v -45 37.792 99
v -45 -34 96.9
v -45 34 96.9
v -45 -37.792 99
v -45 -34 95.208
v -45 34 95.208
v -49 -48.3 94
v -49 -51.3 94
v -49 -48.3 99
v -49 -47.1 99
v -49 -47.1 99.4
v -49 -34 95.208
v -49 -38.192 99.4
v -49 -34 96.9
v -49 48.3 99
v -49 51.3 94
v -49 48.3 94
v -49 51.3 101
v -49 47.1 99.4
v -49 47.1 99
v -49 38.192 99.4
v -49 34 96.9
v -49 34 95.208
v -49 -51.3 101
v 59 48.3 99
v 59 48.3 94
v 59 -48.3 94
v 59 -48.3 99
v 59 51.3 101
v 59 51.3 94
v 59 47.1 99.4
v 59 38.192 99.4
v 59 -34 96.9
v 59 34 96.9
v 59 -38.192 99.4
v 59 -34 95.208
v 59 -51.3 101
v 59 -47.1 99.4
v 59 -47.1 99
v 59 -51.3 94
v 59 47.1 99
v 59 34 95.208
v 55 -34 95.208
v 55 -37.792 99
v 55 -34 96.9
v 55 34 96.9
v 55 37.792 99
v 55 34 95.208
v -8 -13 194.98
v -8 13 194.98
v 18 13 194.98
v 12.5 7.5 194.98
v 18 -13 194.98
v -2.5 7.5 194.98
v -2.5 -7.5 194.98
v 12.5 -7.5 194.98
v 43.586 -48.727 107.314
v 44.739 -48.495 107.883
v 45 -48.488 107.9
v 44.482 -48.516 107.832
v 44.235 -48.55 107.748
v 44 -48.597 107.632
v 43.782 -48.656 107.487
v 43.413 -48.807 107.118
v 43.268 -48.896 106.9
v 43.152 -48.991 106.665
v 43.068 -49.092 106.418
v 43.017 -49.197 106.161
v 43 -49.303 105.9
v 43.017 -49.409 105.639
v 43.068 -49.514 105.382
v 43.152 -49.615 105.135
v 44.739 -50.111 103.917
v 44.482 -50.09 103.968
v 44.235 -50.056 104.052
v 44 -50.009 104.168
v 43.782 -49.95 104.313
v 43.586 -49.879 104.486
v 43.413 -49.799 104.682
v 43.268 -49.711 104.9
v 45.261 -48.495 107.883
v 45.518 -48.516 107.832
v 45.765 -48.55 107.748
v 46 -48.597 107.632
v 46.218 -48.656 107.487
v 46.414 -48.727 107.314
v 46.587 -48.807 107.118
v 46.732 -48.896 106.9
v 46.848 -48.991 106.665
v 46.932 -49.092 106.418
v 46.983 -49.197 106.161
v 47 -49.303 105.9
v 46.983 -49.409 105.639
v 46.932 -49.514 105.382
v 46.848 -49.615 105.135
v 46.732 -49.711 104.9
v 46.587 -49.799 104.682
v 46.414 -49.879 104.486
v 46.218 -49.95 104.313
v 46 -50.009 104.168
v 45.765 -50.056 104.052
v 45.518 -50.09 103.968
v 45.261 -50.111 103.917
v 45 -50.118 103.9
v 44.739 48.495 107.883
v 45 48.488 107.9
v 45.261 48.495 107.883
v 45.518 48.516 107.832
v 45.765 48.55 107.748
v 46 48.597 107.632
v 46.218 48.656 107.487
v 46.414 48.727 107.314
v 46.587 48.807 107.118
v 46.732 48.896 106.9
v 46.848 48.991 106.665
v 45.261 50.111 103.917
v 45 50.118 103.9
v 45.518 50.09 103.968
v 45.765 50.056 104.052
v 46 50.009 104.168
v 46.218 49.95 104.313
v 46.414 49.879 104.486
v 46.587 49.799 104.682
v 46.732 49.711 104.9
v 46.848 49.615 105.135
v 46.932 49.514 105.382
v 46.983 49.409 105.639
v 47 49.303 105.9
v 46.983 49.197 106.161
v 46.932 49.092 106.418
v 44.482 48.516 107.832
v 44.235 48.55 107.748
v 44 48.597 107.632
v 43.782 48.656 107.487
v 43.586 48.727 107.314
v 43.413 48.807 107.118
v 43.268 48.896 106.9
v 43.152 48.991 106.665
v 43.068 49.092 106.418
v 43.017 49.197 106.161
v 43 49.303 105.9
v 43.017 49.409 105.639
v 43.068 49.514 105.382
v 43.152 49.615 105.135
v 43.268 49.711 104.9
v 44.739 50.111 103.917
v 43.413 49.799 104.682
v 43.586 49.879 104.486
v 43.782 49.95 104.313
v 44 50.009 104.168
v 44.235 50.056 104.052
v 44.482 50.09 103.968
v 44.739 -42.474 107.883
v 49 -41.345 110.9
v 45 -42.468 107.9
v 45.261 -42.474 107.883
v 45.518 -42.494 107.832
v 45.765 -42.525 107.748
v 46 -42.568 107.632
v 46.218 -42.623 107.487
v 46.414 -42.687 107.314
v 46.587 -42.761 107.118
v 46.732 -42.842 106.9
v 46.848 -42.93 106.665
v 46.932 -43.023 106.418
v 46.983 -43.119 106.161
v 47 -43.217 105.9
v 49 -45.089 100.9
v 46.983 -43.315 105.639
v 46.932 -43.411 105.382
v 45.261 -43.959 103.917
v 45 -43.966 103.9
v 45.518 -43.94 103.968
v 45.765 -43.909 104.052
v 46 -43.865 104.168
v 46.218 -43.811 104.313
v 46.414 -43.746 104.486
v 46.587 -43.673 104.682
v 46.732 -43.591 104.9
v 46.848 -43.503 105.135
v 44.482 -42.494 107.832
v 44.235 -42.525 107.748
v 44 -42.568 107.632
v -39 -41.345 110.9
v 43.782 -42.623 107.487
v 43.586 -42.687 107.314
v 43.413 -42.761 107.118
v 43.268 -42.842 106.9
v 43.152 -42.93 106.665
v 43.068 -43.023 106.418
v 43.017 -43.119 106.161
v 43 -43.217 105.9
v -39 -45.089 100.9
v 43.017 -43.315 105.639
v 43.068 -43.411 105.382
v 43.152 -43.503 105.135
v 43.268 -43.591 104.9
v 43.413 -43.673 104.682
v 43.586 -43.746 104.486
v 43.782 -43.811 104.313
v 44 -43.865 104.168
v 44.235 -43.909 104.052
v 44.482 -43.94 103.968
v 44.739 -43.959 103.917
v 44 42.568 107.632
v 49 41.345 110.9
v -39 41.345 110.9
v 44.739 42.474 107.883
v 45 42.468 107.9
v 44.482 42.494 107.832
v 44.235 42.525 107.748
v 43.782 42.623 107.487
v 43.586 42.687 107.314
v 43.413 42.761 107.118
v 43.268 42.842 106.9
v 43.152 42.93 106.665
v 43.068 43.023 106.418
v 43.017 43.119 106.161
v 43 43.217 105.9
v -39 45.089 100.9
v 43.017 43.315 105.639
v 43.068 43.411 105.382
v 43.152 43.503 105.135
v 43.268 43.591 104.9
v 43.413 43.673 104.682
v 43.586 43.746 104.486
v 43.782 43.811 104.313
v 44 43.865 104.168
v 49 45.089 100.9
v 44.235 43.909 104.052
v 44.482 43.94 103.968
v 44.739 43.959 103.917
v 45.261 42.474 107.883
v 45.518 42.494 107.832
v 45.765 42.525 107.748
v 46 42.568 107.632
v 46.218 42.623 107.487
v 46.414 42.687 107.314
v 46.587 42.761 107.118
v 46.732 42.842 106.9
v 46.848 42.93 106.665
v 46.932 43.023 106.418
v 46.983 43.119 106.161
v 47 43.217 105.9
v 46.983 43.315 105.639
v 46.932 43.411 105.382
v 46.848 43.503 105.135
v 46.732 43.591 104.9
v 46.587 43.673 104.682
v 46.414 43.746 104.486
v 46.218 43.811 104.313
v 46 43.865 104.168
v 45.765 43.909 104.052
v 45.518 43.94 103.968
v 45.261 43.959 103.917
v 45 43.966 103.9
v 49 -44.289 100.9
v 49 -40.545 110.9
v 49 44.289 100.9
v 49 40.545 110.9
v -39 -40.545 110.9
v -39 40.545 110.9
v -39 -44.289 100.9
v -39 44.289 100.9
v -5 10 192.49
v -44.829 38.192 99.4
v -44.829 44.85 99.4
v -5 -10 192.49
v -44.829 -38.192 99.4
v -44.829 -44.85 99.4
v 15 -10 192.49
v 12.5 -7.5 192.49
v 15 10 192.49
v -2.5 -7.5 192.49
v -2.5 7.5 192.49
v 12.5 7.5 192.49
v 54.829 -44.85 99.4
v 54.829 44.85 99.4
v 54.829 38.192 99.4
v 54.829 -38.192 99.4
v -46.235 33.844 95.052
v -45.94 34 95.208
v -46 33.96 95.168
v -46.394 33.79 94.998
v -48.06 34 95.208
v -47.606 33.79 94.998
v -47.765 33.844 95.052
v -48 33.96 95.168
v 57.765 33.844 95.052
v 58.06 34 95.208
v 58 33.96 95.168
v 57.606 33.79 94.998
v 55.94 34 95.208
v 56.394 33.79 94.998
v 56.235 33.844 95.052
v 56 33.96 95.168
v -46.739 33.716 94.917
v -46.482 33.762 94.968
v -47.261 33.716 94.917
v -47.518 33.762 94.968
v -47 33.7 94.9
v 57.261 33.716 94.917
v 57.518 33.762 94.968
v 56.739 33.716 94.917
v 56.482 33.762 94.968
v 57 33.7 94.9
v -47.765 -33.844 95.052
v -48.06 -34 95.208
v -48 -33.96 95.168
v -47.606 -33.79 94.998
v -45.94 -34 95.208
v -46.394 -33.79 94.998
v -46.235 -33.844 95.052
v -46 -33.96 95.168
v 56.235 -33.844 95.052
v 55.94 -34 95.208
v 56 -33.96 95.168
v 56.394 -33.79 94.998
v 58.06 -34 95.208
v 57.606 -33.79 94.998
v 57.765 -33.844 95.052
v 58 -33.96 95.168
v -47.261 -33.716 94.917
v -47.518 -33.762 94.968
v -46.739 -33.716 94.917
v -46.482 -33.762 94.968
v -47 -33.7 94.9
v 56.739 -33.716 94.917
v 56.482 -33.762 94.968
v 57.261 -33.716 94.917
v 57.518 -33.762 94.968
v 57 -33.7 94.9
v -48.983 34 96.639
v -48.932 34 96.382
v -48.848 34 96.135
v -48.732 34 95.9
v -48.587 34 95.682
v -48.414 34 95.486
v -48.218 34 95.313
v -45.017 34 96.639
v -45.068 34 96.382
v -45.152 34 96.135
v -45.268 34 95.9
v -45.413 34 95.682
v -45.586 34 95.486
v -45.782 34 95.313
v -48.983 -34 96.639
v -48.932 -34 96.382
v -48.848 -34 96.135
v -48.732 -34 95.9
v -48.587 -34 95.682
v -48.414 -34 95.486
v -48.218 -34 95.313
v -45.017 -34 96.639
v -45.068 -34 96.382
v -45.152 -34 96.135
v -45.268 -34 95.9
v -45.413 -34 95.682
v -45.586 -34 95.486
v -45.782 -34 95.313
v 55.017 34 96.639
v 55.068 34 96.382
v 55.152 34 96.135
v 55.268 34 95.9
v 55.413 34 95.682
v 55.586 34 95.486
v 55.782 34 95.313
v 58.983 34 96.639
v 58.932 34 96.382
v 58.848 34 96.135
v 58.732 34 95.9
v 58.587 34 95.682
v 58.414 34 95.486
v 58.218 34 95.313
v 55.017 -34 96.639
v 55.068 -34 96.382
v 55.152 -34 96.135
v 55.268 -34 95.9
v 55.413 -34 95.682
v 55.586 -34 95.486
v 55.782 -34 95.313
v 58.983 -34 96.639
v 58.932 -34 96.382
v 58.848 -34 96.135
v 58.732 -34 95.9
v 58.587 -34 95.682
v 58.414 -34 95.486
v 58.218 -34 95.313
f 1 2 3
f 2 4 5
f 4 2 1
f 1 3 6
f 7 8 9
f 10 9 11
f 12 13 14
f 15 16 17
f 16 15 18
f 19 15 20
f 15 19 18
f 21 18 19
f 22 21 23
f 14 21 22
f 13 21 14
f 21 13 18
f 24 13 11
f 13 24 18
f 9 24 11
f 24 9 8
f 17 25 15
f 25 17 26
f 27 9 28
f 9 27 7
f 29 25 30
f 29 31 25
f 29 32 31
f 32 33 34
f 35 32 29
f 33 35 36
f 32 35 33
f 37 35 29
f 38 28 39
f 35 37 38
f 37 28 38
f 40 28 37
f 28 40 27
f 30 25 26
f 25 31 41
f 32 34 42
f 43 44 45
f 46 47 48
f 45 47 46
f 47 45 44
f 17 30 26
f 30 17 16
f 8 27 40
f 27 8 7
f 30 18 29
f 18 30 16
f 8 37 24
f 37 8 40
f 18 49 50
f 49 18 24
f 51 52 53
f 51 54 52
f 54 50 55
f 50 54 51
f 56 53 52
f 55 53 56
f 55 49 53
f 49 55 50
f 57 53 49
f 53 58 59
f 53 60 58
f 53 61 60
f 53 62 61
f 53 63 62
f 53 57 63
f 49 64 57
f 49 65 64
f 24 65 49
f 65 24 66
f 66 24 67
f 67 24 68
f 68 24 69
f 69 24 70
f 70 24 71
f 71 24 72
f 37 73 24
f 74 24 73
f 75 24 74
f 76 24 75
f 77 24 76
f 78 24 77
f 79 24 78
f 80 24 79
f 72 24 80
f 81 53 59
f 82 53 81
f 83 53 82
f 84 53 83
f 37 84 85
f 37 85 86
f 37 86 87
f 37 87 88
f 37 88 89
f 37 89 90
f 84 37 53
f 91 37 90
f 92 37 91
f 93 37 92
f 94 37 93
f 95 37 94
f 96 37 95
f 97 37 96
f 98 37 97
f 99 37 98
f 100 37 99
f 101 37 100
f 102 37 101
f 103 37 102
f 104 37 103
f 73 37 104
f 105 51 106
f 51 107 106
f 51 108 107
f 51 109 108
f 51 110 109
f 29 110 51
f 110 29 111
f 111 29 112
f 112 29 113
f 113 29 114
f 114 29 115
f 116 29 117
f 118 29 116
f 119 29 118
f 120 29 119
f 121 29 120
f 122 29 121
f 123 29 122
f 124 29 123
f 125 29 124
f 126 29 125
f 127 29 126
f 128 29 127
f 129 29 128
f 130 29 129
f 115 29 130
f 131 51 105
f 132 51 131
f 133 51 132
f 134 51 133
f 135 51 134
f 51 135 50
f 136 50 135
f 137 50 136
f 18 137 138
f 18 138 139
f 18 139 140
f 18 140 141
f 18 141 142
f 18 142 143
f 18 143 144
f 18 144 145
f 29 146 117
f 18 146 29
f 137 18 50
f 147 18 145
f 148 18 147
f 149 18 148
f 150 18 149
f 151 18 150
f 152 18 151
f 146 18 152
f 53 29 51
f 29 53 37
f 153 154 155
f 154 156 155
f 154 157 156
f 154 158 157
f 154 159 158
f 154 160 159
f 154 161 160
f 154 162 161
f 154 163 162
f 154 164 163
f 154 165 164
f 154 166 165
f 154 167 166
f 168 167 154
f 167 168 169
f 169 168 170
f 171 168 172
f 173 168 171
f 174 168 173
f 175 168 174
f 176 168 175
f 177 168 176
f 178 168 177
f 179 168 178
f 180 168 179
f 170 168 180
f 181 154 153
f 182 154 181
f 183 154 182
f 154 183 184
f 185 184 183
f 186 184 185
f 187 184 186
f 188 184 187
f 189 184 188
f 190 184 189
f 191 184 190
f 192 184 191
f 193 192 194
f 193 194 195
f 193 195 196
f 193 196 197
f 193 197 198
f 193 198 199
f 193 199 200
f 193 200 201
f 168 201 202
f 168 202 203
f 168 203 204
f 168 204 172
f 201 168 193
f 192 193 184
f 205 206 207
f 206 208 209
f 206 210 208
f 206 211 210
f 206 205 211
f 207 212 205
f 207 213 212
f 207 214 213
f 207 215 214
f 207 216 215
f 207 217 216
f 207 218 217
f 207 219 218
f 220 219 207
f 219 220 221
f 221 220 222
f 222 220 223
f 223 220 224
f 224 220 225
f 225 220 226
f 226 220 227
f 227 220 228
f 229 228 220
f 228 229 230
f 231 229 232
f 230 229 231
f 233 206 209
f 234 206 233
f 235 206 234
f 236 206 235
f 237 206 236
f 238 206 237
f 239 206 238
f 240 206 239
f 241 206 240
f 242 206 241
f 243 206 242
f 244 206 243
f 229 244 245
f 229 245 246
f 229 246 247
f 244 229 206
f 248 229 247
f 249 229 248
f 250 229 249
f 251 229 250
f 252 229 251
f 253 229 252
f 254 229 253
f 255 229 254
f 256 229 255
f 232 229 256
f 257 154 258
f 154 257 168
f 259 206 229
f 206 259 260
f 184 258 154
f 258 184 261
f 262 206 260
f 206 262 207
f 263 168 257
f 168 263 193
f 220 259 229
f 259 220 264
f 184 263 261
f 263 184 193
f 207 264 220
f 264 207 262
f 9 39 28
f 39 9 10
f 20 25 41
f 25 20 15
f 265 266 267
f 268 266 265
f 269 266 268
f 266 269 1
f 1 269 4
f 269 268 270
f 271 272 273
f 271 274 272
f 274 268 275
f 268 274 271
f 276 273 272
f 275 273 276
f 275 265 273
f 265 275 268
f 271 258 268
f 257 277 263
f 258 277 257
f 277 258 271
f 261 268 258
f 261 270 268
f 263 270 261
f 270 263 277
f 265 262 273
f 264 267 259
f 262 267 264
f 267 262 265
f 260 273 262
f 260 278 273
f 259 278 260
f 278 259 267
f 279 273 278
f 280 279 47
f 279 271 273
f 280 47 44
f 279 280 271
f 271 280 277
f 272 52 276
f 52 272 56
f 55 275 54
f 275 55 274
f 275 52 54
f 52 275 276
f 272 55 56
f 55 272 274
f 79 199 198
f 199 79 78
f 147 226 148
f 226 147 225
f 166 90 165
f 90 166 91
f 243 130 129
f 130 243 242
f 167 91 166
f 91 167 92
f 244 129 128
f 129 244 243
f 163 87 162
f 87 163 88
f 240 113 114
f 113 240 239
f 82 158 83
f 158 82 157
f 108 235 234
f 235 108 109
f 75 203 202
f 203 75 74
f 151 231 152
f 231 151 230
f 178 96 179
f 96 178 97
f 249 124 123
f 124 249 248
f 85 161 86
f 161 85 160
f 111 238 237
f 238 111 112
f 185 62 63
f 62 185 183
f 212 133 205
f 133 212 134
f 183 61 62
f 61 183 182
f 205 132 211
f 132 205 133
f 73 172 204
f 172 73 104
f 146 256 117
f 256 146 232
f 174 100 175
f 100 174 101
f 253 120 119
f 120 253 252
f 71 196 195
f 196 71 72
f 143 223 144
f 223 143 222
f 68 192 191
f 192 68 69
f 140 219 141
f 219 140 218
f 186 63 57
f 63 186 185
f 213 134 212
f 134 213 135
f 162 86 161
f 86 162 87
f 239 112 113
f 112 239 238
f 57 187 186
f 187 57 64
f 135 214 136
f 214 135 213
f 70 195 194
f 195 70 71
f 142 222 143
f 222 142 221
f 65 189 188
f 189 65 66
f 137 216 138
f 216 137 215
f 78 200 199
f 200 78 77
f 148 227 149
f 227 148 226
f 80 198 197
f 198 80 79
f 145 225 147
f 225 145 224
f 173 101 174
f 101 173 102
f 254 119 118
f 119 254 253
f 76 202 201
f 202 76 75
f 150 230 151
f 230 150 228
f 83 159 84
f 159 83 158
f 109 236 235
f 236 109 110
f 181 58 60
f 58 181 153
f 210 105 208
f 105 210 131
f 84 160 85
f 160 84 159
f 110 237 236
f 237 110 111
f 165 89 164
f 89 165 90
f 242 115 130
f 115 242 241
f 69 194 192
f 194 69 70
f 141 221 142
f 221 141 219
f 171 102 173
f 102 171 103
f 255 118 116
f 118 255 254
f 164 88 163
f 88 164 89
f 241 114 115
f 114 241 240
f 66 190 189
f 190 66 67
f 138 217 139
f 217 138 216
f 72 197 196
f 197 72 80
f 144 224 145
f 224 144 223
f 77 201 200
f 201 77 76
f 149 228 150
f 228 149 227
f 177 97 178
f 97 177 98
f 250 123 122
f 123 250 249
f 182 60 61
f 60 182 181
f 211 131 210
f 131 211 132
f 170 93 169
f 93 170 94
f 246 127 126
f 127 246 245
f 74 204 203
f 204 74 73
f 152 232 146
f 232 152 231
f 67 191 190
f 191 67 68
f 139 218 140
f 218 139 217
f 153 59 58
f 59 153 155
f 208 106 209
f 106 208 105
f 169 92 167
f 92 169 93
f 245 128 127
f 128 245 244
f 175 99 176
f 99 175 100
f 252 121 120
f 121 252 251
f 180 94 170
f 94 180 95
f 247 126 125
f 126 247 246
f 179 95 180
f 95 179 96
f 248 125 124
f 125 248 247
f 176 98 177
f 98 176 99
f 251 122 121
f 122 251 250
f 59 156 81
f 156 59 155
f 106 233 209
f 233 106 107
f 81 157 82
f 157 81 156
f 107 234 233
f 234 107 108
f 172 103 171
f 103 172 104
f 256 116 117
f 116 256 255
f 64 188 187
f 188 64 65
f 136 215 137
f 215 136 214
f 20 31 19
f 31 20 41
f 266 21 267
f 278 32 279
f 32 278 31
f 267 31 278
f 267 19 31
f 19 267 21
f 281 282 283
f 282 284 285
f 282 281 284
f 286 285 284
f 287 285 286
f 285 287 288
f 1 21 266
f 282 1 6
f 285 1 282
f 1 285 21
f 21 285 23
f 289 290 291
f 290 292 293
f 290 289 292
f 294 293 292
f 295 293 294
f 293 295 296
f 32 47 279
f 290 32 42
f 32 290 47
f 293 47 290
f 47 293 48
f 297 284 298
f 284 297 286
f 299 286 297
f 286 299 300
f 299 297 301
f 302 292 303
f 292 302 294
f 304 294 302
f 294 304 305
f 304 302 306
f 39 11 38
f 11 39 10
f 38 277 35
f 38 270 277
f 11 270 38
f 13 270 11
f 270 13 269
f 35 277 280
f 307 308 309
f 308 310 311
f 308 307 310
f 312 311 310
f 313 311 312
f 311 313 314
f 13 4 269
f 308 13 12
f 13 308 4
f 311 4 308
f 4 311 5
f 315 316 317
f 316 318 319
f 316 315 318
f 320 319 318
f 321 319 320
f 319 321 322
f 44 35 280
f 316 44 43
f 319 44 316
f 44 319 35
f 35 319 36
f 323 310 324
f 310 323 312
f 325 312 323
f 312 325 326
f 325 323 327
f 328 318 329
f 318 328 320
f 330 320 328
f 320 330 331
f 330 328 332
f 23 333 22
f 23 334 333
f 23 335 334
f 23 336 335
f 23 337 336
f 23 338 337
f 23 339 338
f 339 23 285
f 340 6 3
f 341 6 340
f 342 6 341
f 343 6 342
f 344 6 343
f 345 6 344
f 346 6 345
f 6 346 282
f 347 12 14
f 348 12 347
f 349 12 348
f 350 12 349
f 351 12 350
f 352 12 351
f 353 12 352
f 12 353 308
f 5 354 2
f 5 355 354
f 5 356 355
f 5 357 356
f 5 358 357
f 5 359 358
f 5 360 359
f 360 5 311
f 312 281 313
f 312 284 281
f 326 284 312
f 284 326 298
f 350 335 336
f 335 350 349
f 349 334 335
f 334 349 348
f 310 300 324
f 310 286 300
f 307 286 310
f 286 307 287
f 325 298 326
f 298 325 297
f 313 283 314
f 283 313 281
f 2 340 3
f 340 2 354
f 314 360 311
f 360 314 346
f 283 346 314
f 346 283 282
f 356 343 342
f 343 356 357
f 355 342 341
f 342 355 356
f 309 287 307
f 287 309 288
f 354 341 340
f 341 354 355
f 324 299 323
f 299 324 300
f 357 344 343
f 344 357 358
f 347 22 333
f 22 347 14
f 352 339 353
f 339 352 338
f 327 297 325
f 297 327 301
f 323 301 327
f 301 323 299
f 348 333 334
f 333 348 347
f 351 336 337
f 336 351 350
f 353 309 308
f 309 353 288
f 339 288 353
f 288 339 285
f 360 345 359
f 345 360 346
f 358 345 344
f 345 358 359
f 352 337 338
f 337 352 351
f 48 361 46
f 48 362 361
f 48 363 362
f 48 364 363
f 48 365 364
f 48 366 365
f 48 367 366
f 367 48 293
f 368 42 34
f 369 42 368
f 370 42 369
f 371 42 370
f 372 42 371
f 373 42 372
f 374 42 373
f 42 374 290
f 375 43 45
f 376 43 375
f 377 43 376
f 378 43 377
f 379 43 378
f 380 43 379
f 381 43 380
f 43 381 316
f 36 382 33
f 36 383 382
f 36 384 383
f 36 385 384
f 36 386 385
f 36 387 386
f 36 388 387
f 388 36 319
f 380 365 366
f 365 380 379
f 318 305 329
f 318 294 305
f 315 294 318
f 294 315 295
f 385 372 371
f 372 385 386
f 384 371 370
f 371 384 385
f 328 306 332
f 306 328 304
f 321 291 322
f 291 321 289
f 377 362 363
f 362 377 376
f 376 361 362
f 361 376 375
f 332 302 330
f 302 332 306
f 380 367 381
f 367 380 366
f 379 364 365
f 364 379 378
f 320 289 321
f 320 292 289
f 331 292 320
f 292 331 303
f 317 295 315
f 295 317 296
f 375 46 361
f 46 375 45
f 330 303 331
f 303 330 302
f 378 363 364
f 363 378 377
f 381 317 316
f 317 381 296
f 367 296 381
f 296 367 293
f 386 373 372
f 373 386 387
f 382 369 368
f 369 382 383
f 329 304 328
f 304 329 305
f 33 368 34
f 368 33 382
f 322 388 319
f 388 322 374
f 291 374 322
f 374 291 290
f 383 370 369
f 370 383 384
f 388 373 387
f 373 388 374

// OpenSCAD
// file: machine_frame.scad
// =============================================
// Riftbound Card Sorter — shared machine frame
// =============================================
// Single source of truth for the card path after the Nov 11 redesign
// (suction pick from a motor-raised hopper, raised transport line,
// cradle shuttle sorter). Machine coords as in assembly.scad:
//   X = card travel (hopper -> belt -> tray), Y = across belt (+Y = back,
//   electronics side), Z = up, Z=0 bottom of baseplate tiles.
// `use <machine_frame.scad>` does not import variables, so read these via
// the functions at the bottom.
// =============================================

base_top   = 4;      // top of baseplate tiles
riser_h    = 60;     // conveyor deck raised so cards can FALL into both tray floors
deck_z     = base_top + riser_h;          // rail base / hopper deck reference = 64

// Conveyor (geometry unchanged, just lifted by riser_h)
belt_x0    = -165;   // belt start
belt_x1    = 85;     // belt end
roller_x   = [-140, 60];
rail_in    = 45;     // |Y| of rail inner faces
shaft_z    = deck_z + 15;
card_z     = deck_z + 15 + 11.9;          // top of round belts = card face = 90.9
scan_flat  = [-127, 47];                  // slide-bed backed flat zone (X)

// Scanner
cam_x      = 5;      // lens axis; card centred here for capture (moved from -40 so the hood clears the arm drop zone at X -139..-51)

// Hopper (motor-raised floor keeps top card at card_z)
hopper_x   = -215;   // cavity centre X (Y = 0)

// Baseplate extents (3x3 tiles of 190x180)
base_x     = [-285, 285];
base_y     = [-270, 270];

// Pick & place hand-off
drop_x     = -95;    // card CENTRE when the suction arm releases it onto the belt
                     // (card spans -139..-51: on belts, clear of hopper wall)
drop_clear = 3;      // card underside this far above belt at release (low drop)

// Sorting tray (bottom on baseplate); owner of tray placement may move it in X
tray_floor_lower_z = base_top + 2.5;      // lower slot floor
tray_floor_upper_z = base_top + 65 + 3 + 2.5;  // = 74.5 upper slot floor

// Card
card_w = 63; card_l = 88; card_t = 0.33;  // RAW cards (owner confirmed 2026-11-11: no sleeves), ~1.75 g

// MG996R mounting-tab holes (all three servos: pick arm ch0, shuttle ch1 / ch2).
// ONE value for every mount: hole-centre pitch along the case (49.5, TowerPro
// MG996R drawing) × across it (10), symmetric about the case centre. Clones
// vary (48.5..50 seen); the servo's own tab holes are Ø4.5+ grommet holes, so
// an M3 / M2.5 still lands for ±0.7 mm. MEASURE YOUR SERVO; if it is further
// off, change it here and re-export the arm head and the shuttle end post / riser.
mg996r_hole_pitch = 49.5;
mg996r_hole_dx    = 10;

function frame_base_top()  = base_top;
function frame_riser_h()   = riser_h;
function frame_deck_z()    = deck_z;
function frame_belt_x0()   = belt_x0;
function frame_belt_x1()   = belt_x1;
function frame_roller_x()  = roller_x;
function frame_rail_in()   = rail_in;
function frame_card_z()    = card_z;
function frame_scan_flat() = scan_flat;
function frame_cam_x()     = cam_x;
function frame_hopper_x()  = hopper_x;
function frame_base_x()    = base_x;
function frame_base_y()    = base_y;
function frame_drop_x()    = drop_x;
function frame_drop_clear()= drop_clear;
function frame_tray_floor_lower_z() = tray_floor_lower_z;
function frame_tray_floor_upper_z() = tray_floor_upper_z;
function frame_mg996r_hole_pitch() = mg996r_hole_pitch;
function frame_mg996r_hole_dx()    = mg996r_hole_dx;
// main file
// =============================================
// Riftbound Card Sorter — Scanner Hood (+ asm_scan_station)
// =============================================
// Light-tight box over the scan zone. Straddles both conveyor rails and rests
// ONLY on the rails' 1.2 mm top fins (z 99; contact |Y| 47.1..48 × 108 mm per
// side ≈ 190 mm² — the hood keeps 0.4 mm off the card guides and their
// groove fills, which stop at |Y| 46.7), skirts overlap the rails' outer
// faces by 5 mm. The camera (camera_bracket.scad) hangs
// above it with the lens through the roof port, so no room light reaches
// the card except through the two low card slots.
//
// Print 1×, roof down (part = "hood"). Black PLA/PETG, 0.2 mm, 3 walls,
// 15 % infill. No supports: walls lean ≤ 23° from vertical, everything else
// opens upward in print orientation.
// BRIM REQUIRED: the print is 101 mm tall and grows outward from a 26 × 26
// roof with a 15 × 15 lens port, i.e. only 451 mm² on the bed under a
// 108 × 103 top. Use an 8–10 mm brim (outer brim only; or 4 Ø15 mouse ears
// at the roof corners), a clean textured/PEI plate with glue stick for
// PETG, and ≤ 60 mm/s outer walls; a tall top-heavy part on that footprint
// otherwise lifts or is knocked off by the nozzle near the top.
//
// COORDINATES: machine frame (machine_frame.scad); scanner_hood() is already
// placed. asm_scan_station() places hood + guides + clips + camera bracket.
//
// ---------------------------------------------
// GEOMETRY (cam_x = frame_cam_x(), card face zc = 90.9, rail top 99)
//   Inner length along X 100 (cam_x ± 50), end walls 4 → outer cam_x ± 54
//   Inner width over the rails |Y| 45, skirts |Y| 48.3..51.3 down to z 94
//   Card slots: |Y| ≤ 34.0, ceiling zc + 4.0 = 94.9 (3.5 mm over a 0.5 mm
//     sleeved card), ceiling edge a full R2 bullnose. Beyond |Y| 34 the end
//     wall follows the card-guide profile with 0.4 mm clearance.
//   Walls taper from (±50, ±45) at z 99 to (±10, ±10) under the roof
//   Roof 2.5 mm, top at PCB front − 2.9 = z 195.0; lens port 15 × 15
//
// VIEW-CONE MATH (Pi Cam 3 standard, apex at the lens tip, h = height
// above the card face, lens tip at h = 100):
//   full FOV half-widths at h:  X (100 − h)·tan 33°   = 0.649·(100 − h)
//                               Y (100 − h)·tan 20.5° = 0.374·(100 − h)
//     at the card (h = 0): X ±64.9, Y ±37.4
//   needed region = card + 5 mm: X ±(44 + 5) = ±49
//                                Y ±(31.5 + 1.7 play + 5) = ±38.2 → capped by
//                                the sensor at ±37.4
//   needed half-widths at h:  X 49·(1 − h/100), Y 38.2·(1 − h/100)
//   hood interior at h (z = 90.9 + h), for z ≥ 99:
//     X 50 − 40·(z − 99)/93.5,  Y 45 − 35·(z − 99)/93.5
//     at z  99 (h  8.1): interior X ±50.0 / Y ±45.0 vs needed ±45.0 / ±35.1
//     at z 150 (h 59.1): interior X ±28.2 / Y ±25.9 vs needed ±20.0 / ±15.6
//     at z 190.9 (lens):  interior X ±10.7 / Y ±10.6 vs needed 0
//   below z 99 the interior is the rail channel |Y| < 45 and the end walls'
//   inner faces at X ±50, which the cone passes at ±47.0 at the slot ceiling
//   (h = 4). → No hood or guide surface is inside the card + 5 mm cone.
//   The roof is ABOVE the lens tip, so the "window" is just a port for the
//   lens body: the cone starts below the roof and the port never clips it.
//
// LIGHTING: the old ø52 LED-ring recess is dropped — a ring around the lens
//   puts a specular hotspot in the middle of glossy/foil cards. Instead the
//   two long inner side walls carry a 10 mm band (0.8 mm recess) at
//   h = 10..20 mm for 8 mm LED strip (≈ 88 mm per side, wires through the
//   ø4 holes). Mirror glare of a strip at (Y_L, h_L) lands on the card plane
//   at y = Y_L·100/(100 + h_L): strip centre (42.4, 15) → 36.9, strip top
//   edge (40.5, 20) → 33.8, both outside the card even at 1.7 mm play (33.2).
//   Strips must stay below h ≈ 21 for that to hold.
// ---------------------------------------------

use <machine_frame.scad>
use <card_guide.scad>
use <camera_bracket.scad>

/* [Export] */
part = "assembly";   // assembly (hood in place) | hood (print orientation) | station

$fn = 48;

cx        = frame_cam_x();
zc        = frame_card_z();
rail_in   = frame_rail_in();          // 45
rail_top  = guide_rail_top();         // 99
ch_hw     = guide_channel_hw();       // 33.2

// --- Shell ---
out_hx    = scan_hood_half_len();     // 54 (card_guide.scad keeps clips clear of it)
end_t     = 4;
in_hx     = out_hx - end_t;           // 50 → inner length 100
sk_in     = rail_in + 3 + 0.3;        // 48.3 (rail outer face 48)
sk_out    = sk_in + 3;                // 51.3
sk_bot    = rail_top - 5;             // 94 (5 mm overlap on the rail outer face)
z_lb      = rail_top + 2;             // top of the vertical lower band
roof_t    = 2.5;
roof_top  = zc + cam_pcb_front_rel() - 2.9;   // 195.0: M2 heads clear by ≥ 0.9
roof_bot  = roof_top - roof_t;
top_out   = 13;                       // outer half-size at the roof
top_in    = 10;                       // inner half-size under the roof
port      = 15;                       // lens-body port (lens holder ≤ ~12 mm)

// --- Card slots ---
slot_hw   = 34.0;                     // guide envelope meets the slot ceiling here
slot_top  = zc + 4.0;                 // 94.9
lip_r     = end_t / 2;                // full bullnose on the slot ceiling

// --- LED bands ---
led_h     = [10, 20];                 // above the card face
led_d     = 0.8;
led_hx    = 44;
wire_d    = 4;

// --- View cone check values ---
lens_z    = zc + cam_lens_h();
need_hx   = 88 / 2 + 5;
need_hy   = min(63 / 2 + (ch_hw - 63 / 2) + 5, cam_lens_h() * tan(20.5));
function need_x(z) = need_hx * (lens_z - z) / (lens_z - zc);
function need_y(z) = need_hy * (lens_z - z) / (lens_z - zc);
function cav_x(z)  = in_hx - (in_hx - top_in) * (z - rail_top) / (roof_bot - rail_top);
function cav_y(z)  = rail_in - (rail_in - top_in) * (z - rail_top) / (roof_bot - rail_top);

echo(str("HOOD: X ", cx - out_hx, "..", cx + out_hx, " (inner ", 2 * in_hx, "), roof top z ", roof_top,
         ", slot |Y|≤", slot_hw, " ceiling z ", slot_top, " (", slot_top - zc, " over card face)"));
echo(str("HOOD VIEW CONE: needed card+5 at card plane X ±", need_hx, " Y ±", need_hy,
         "; at z99 cavity ±", cav_x(99), "/±", cav_y(99), " vs ±", need_x(99), "/±", need_y(99),
         "; at slot ceiling needed X ±", need_x(slot_top), " vs end wall ", in_hx));
for (z = [rail_top : 10 : roof_bot])
    assert(cav_x(z) >= need_x(z) + 3 && cav_y(z) >= need_y(z) + 3, str("hood wall in view cone at z ", z));
assert(need_x(slot_top) + 2 < in_hx, "end wall in view cone");

module slab(x0, x1, y, z) translate([x0, -y, z]) cube([x1 - x0, 2 * y, 0.01]);
module slab_c(hx, hy, z)  translate([cx - hx, -hy, z]) cube([2 * hx, 2 * hy, 0.01]);

module hood_outer() {
    // vertical lower band: skirts + rest-on-rail band
    translate([cx - out_hx, -sk_out, sk_bot]) cube([2 * out_hx, 2 * sk_out, z_lb - sk_bot]);
    // end walls down into the rail channel (trimmed by the keep-out)
    for (x = [cx - out_hx, cx + in_hx])
        translate([x, -sk_in, zc - 0.4]) cube([end_t, 2 * sk_in, z_lb - zc + 0.4]);
    // tapered body
    hull() {
        slab(cx - out_hx, cx + out_hx, sk_out, z_lb - 0.01);
        slab_c(top_out, top_out, roof_top - 0.01);
    }
}

module hood_cavity() {
    // rail channel + rails below the rest plane
    translate([cx - in_hx, -sk_in, zc - 20]) cube([2 * in_hx, 2 * sk_in, rail_top - zc + 20]);
    // tapered interior
    hull() {
        slab_c(in_hx, rail_in, rail_top - 0.01);
        slab_c(top_in, top_in, roof_bot);
    }
    // lens port
    translate([cx - port / 2, -port / 2, roof_bot - 1]) cube([port, port, roof_t + 2]);
    // LED strip bands on the two long side walls
    intersection() {
        hull() {
            slab_c(in_hx + led_d, rail_in + led_d, rail_top - 0.01);
            slab_c(top_in + led_d, top_in + led_d, roof_bot);
        }
        translate([cx - led_hx, -100, zc + led_h[0]]) cube([2 * led_hx, 200, led_h[1] - led_h[0]]);
        union() for (s = [-1, 1]) translate([cx - 100, s > 0 ? 25 : -125, 0]) cube([200, 100, 300]);
    }
    // LED wire holes, one per side at the downstream end of the band
    translate([cx + led_hx - 4, 0, zc + (led_h[0] + led_h[1]) / 2])
        rotate([90, 0, 0]) cylinder(d = wire_d, h = 2 * sk_out + 10, center = true);
}

// Everything the hood must stay clear of below the rest plane
module hood_keepout() {
    xa = cx - out_hx - 1; xb = cx + out_hx + 1;
    card_guide_envelope(xa, xb, 0.4);
    // rail walls + groove fills (rest plane z 99 stays)
    for (s = [-1, 1])
        translate([xa, s > 0 ? rail_in - 0.4 : -sk_in, zc - 30]) cube([xb - xa, sk_in - rail_in + 0.4, rail_top - zc + 30]);
    // card slots with an R2 bullnose ceiling at both end walls
    for (x = [cx - out_hx, cx + in_hx])
        difference() {
            translate([x - 1, -slot_hw, zc - 30]) cube([end_t + 2, 2 * slot_hw, slot_top + lip_r - zc + 30]);
            translate([x + end_t / 2, 0, slot_top + lip_r]) rotate([90, 0, 0])
                cylinder(r = lip_r, h = 2 * slot_hw + 2, center = true);
        }
    // belts / bed / rollers: nothing below the guide underside inside the rails
    translate([xa, -rail_in, zc - 30]) cube([xb - xa, 2 * rail_in, 30 - 0.5]);
}

module scanner_hood()
    difference() {
        hood_outer();
        hood_cavity();
        hood_keepout();
    }

// Print orientation: roof on the bed
module scanner_hood_print() translate([0, 0, roof_top]) rotate([180, 0, 0]) translate([-cx, 0, 0]) scanner_hood();

// ── Scan station: hood + guides + clips + camera bracket, machine coords ──
module asm_scan_station() {
    scanner_hood();
    card_guides();
    camera_bracket_placed();
    %camera_ghost_placed();
}

if (part == "assembly") scanner_hood();
if (part == "hood")     scanner_hood_print();
if (part == "station")  asm_scan_station();

// =============================================
// INSTALL: guides first, then lower the hood straight down over the rails
//   (skirts outside, end walls straddling the guides), then lower the camera
//   bracket so the lens drops into the roof port. To lift the hood, remove
//   the bracket (2 M3) first. Jams: reverse the belt; cards leave through
//   either slot.
// LIGHT: the only openings are the two 68 × 4 mm card slots (plus 0.4 mm
//   gaps around the guides) and the 2.9 mm gap between roof and camera PCB;
//   a 2-3 mm black foam ring around the lens on the roof closes the latter.
// =============================================
